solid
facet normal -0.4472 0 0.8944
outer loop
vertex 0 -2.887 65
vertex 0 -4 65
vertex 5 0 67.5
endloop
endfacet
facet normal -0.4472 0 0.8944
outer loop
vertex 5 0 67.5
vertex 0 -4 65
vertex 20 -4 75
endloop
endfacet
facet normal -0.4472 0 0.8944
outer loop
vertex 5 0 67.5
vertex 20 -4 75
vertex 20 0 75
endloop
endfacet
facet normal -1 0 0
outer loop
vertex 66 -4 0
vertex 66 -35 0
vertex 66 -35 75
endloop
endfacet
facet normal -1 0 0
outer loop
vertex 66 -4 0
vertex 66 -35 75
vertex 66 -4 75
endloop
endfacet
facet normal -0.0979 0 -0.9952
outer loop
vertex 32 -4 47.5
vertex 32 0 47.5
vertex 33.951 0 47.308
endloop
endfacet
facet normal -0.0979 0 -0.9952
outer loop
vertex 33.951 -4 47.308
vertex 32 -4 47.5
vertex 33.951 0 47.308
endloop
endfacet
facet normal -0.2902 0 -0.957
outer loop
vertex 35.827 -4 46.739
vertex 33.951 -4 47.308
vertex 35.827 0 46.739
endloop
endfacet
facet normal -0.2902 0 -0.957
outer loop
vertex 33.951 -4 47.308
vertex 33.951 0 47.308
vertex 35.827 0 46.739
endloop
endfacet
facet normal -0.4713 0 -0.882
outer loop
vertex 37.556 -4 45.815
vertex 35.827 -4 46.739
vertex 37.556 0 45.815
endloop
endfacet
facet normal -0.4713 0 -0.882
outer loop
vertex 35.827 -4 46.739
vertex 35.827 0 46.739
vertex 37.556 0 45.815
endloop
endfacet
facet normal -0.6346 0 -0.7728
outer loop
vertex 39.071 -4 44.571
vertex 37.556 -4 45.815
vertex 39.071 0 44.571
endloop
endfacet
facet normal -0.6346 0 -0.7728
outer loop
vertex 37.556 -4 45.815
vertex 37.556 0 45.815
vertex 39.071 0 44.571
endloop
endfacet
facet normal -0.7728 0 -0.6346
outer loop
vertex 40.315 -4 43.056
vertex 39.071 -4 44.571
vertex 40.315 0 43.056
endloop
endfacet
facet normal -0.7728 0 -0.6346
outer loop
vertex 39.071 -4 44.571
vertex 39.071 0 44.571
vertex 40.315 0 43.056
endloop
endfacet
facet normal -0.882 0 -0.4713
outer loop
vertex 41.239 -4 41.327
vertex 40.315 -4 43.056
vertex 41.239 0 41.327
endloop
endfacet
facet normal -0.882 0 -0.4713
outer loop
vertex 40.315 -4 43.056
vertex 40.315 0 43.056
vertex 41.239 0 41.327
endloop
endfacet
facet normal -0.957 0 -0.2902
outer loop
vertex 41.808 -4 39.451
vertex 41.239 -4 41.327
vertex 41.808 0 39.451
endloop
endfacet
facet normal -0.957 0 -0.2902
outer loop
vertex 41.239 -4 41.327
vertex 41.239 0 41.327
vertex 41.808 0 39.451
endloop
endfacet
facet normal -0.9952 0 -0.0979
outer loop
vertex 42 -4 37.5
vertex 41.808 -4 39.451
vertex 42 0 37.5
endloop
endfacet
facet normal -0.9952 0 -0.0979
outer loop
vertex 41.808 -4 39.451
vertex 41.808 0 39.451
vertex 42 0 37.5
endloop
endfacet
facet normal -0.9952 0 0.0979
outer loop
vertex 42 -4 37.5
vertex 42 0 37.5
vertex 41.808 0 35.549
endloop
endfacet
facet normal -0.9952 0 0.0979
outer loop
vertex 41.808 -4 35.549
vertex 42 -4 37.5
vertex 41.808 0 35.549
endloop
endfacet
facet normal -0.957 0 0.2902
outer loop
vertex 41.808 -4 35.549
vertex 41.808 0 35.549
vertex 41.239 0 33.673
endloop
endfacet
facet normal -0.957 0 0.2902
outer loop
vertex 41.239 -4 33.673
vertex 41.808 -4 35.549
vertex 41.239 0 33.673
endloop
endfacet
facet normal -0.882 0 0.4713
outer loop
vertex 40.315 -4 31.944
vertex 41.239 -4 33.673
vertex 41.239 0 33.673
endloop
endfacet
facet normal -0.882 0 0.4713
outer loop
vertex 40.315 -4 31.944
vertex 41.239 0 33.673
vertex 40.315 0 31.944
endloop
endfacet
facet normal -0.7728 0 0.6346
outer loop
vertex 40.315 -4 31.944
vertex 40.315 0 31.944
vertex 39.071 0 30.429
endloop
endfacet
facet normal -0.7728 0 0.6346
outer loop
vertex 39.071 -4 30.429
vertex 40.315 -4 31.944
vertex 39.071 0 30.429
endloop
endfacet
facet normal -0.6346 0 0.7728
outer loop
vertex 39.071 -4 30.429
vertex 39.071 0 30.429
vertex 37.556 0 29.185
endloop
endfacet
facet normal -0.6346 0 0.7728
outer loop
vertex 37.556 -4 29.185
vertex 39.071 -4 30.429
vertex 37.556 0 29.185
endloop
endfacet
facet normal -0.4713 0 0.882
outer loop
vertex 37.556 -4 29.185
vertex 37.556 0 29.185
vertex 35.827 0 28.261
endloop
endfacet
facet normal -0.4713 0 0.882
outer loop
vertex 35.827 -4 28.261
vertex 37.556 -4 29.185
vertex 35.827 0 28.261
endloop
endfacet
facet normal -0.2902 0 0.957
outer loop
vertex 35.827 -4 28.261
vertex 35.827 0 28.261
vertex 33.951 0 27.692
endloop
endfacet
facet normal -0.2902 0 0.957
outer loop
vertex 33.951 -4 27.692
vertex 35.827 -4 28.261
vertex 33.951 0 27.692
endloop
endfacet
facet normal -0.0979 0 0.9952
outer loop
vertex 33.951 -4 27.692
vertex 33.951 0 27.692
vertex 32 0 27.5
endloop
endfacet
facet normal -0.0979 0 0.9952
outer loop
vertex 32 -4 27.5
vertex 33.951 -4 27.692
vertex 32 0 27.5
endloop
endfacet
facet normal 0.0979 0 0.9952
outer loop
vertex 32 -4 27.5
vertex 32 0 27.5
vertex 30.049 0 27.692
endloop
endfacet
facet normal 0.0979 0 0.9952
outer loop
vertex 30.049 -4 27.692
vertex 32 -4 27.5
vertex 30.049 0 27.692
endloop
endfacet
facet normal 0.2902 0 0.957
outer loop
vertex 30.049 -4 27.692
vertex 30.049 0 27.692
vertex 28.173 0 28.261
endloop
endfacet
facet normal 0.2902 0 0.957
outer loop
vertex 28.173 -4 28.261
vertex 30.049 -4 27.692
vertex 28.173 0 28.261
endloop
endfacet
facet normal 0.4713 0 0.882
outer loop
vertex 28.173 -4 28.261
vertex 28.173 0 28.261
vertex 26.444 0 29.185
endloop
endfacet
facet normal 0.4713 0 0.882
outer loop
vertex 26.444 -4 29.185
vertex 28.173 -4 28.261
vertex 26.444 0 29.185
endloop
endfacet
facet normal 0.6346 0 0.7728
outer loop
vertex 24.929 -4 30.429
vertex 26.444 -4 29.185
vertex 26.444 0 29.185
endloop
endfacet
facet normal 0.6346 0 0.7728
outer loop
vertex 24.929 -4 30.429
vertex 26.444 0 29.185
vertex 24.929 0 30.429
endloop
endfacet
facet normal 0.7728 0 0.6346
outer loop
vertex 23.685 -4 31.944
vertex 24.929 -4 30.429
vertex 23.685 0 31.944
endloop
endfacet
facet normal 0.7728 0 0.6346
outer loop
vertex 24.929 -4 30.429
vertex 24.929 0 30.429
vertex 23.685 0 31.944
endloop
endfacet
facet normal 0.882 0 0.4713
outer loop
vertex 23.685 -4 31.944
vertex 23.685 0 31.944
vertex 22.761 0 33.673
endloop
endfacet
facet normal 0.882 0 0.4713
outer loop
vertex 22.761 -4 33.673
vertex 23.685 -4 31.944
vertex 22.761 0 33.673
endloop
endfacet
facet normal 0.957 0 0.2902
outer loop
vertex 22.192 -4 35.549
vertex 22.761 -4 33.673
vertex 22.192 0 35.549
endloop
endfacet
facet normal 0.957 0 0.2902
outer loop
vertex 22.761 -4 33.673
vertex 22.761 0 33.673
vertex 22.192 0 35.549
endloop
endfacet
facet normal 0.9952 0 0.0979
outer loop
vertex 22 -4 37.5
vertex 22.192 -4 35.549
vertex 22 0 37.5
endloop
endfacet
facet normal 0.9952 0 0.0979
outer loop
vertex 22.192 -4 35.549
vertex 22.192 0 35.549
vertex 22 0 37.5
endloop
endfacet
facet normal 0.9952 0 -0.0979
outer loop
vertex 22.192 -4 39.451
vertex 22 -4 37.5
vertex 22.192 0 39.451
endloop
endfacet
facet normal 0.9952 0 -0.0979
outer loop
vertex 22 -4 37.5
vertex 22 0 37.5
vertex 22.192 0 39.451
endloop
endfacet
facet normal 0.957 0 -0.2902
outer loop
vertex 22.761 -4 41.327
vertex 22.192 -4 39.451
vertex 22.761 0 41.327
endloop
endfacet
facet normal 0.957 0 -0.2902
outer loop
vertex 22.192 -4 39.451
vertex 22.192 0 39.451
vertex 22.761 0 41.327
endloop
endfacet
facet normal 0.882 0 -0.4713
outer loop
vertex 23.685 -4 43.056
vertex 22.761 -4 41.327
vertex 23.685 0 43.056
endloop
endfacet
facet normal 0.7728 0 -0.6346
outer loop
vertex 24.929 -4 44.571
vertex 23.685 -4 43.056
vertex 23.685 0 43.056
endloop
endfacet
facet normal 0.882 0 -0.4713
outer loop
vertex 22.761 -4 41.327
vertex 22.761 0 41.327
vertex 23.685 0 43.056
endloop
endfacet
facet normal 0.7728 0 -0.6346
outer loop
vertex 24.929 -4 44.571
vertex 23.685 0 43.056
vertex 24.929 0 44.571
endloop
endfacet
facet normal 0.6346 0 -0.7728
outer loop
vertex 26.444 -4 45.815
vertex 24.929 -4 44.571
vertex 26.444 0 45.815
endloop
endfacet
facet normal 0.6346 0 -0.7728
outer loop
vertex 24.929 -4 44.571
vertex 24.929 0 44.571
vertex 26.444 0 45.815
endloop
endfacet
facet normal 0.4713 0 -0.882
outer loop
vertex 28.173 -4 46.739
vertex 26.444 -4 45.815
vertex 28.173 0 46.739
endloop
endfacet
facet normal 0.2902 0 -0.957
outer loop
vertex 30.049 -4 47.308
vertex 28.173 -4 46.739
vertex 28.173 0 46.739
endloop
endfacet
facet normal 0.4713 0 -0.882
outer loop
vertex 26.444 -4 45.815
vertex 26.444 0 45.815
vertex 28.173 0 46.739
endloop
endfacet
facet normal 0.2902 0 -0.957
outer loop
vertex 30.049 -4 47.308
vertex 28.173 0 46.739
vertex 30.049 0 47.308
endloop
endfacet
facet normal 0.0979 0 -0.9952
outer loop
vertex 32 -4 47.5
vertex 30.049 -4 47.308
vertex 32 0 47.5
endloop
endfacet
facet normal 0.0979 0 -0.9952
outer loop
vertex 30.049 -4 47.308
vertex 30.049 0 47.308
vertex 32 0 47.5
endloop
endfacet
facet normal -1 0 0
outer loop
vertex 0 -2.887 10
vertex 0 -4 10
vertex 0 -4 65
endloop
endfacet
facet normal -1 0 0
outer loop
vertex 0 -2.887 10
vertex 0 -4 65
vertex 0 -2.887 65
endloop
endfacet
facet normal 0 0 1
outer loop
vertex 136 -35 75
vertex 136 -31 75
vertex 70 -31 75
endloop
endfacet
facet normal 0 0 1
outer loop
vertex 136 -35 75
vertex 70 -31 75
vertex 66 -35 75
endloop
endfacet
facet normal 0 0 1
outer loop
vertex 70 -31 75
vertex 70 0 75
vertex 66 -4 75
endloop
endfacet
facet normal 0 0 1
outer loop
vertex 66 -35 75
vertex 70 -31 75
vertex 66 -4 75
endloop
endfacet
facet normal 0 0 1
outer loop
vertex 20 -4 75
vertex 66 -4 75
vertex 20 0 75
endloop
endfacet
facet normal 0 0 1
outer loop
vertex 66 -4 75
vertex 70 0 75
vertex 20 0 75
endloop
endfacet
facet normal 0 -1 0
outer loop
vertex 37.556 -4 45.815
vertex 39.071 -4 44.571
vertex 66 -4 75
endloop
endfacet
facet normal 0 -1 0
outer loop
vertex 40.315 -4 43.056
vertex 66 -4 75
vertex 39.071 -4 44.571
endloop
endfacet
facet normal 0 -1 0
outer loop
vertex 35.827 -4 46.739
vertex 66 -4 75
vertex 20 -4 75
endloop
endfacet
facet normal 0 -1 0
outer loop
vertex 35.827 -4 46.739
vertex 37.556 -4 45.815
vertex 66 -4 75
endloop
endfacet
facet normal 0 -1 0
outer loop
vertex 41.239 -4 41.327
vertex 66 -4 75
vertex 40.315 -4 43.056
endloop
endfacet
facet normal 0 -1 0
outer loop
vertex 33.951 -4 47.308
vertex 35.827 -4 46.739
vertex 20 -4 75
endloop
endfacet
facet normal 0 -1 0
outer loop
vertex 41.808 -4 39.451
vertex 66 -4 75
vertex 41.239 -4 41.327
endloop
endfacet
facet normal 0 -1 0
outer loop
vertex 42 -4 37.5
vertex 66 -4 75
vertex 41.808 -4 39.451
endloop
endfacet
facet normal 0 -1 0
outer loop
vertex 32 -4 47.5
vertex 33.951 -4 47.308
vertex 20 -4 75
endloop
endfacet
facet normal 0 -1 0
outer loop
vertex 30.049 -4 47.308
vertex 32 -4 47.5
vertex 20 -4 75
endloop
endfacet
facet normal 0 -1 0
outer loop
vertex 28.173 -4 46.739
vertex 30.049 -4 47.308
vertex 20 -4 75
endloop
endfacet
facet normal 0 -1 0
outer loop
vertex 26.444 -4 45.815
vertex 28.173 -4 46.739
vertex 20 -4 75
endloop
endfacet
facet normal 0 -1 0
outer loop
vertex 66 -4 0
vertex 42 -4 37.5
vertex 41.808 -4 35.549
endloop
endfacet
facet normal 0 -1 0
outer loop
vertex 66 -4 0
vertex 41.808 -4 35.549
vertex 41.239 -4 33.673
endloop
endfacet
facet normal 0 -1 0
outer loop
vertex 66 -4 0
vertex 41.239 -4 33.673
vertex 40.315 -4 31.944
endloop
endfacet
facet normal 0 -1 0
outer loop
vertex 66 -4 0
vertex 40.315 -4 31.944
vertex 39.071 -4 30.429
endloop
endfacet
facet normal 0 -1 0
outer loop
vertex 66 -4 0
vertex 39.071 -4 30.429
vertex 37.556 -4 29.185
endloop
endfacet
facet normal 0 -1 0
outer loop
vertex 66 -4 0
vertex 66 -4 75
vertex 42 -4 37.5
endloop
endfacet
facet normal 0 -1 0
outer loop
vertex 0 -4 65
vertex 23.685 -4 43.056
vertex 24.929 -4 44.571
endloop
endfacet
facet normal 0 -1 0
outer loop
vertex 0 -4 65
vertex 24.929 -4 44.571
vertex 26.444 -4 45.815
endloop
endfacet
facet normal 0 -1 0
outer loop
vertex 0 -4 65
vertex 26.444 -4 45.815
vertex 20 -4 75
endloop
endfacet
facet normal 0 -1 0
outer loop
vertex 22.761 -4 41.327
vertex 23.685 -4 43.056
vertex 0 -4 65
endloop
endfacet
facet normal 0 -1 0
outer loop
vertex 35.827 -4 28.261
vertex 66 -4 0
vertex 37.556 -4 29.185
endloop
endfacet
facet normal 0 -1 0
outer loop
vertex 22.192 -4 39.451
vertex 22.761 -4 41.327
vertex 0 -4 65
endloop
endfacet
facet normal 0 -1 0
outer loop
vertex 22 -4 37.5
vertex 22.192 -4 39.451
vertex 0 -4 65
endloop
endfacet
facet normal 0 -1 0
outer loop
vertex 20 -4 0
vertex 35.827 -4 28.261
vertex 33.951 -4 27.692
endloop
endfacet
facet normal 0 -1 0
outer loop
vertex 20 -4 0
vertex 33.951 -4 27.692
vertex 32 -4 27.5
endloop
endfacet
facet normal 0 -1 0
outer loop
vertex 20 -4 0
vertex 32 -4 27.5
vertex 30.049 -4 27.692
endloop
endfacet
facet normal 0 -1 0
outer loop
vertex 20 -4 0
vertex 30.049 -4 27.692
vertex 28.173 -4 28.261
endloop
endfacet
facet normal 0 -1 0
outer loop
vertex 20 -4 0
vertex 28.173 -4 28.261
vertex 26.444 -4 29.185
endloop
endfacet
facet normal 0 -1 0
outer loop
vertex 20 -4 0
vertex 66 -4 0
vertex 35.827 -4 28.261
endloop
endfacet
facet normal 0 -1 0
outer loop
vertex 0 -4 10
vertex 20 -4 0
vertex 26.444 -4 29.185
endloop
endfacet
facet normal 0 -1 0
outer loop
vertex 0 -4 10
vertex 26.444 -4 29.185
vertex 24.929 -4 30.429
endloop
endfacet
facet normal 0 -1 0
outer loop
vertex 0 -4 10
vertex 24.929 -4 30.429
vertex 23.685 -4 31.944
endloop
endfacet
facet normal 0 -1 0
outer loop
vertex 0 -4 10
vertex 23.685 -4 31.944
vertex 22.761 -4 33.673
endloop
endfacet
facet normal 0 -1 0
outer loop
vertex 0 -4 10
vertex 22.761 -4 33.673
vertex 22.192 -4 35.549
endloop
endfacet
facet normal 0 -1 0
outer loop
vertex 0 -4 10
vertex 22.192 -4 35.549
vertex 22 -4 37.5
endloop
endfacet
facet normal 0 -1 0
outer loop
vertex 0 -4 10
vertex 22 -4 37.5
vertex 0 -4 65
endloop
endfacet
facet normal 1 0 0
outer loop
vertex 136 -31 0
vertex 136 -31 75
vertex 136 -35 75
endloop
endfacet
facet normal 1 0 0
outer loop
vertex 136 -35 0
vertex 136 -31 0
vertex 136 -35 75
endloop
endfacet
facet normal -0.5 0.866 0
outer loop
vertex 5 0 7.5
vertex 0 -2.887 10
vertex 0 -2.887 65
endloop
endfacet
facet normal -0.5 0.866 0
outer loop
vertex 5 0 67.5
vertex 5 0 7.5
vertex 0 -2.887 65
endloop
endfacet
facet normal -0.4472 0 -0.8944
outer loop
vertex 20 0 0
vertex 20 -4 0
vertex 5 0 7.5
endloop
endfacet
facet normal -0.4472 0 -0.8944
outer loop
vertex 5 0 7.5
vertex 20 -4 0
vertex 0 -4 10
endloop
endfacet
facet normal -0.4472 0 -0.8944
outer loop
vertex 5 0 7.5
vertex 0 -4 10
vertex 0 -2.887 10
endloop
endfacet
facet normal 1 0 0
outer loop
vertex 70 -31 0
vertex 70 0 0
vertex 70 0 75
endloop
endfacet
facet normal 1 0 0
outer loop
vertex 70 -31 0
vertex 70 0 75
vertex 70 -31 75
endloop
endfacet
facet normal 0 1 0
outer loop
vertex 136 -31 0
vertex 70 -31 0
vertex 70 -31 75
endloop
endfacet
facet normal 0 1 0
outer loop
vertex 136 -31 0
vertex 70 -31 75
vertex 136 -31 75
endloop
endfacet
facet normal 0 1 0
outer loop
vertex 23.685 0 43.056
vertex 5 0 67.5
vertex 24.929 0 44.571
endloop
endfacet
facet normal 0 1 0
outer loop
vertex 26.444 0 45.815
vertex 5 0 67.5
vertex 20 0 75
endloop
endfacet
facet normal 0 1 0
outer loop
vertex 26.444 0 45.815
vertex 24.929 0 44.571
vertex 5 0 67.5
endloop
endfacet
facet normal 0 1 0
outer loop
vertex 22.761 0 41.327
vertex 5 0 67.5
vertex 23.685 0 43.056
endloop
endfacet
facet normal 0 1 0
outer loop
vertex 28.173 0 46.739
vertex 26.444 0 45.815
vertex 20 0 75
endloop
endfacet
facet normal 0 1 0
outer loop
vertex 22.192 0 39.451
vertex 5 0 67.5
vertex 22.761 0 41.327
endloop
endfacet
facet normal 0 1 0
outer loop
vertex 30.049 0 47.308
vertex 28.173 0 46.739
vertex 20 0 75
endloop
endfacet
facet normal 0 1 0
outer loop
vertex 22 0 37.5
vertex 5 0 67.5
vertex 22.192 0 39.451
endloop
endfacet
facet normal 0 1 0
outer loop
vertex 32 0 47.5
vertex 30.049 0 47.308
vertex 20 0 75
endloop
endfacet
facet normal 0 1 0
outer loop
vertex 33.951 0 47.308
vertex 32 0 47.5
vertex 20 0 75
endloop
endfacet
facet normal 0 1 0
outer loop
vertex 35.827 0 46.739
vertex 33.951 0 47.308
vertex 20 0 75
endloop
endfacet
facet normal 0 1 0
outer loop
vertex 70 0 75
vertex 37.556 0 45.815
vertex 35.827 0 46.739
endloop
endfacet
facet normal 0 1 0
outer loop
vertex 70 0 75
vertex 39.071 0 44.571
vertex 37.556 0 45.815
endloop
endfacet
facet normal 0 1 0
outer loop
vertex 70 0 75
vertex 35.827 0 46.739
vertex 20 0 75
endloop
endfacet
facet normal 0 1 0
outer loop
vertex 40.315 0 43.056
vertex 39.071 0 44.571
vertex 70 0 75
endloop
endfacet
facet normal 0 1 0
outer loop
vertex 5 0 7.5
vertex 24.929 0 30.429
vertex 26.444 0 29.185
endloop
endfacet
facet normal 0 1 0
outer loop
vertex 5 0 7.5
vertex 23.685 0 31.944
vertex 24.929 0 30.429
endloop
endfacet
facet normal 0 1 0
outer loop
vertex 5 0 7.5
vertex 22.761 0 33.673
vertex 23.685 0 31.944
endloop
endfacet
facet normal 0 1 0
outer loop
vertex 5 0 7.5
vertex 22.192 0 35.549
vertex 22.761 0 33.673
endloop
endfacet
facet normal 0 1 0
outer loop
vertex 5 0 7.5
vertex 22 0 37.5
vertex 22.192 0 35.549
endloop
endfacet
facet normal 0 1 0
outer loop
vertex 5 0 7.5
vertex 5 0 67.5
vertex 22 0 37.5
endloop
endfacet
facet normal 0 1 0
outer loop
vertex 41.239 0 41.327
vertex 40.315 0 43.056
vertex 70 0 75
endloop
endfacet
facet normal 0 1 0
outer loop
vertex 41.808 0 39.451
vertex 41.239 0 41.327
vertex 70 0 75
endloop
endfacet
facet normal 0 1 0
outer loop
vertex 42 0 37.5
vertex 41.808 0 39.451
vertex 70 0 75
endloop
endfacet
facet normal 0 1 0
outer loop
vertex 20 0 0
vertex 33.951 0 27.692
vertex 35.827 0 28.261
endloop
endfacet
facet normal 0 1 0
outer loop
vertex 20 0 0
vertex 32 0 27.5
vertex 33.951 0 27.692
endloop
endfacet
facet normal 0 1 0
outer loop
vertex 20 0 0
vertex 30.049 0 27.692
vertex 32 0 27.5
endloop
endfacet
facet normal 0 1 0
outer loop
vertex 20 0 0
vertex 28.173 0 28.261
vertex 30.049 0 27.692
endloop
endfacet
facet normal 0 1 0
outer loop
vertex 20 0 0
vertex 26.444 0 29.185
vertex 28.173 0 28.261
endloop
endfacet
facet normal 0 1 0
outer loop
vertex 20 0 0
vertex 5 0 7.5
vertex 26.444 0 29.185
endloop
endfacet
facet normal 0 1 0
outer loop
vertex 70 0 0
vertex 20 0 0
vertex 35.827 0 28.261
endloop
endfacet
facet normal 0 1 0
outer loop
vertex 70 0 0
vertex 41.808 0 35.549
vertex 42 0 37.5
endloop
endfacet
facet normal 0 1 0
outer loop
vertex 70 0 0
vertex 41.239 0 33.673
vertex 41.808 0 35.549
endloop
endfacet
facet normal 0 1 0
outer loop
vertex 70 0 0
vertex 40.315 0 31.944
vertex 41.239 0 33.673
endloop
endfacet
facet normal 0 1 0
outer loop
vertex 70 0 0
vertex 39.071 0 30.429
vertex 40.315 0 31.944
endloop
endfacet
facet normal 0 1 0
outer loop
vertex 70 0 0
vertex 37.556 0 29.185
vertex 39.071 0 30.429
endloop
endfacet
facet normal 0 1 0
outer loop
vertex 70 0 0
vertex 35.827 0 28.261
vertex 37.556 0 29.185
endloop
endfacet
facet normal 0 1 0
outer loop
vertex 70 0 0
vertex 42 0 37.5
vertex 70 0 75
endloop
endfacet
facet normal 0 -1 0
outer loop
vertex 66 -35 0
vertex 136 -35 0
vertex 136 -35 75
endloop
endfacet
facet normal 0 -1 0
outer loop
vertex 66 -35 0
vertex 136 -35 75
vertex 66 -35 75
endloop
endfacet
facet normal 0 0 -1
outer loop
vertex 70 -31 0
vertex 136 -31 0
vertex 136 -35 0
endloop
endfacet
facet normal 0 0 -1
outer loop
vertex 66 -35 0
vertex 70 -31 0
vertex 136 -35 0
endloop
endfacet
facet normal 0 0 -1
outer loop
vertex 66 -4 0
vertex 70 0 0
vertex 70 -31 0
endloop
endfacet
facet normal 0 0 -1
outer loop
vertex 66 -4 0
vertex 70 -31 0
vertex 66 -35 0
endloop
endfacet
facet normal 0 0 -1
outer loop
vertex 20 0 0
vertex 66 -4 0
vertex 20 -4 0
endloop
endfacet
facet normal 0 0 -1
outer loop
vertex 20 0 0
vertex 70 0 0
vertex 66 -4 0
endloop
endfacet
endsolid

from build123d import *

# Parameters (mm, degrees)
BOSS_EXTRUDE1_DEPTH = 75
SKETCH2_R           = 10
CUT_EXTRUDE1_DEPTH  = 160.204271299
CHAMFER1_SIZE       = 10
CHAMFER1_SIZE2      = 20
CHAMFER2_SIZE       = 20
CHAMFER2_SIZE2      = 10
CHAMFER3_SIZE       = 5
CHAMFER3_SIZE2      = 2.886751346


with BuildPart() as part:
    # Sketch1 → Boss-Extrude1 (new body)
    with BuildSketch(Plane.XY):
        Polygon((0, 0), (70, 0), (70, -31), (136, -31), (136, -35), (66, -35), (66, -4), (0, -4), align=None)
    extrude(amount=BOSS_EXTRUDE1_DEPTH)

    # Sketch2 → Cut-Extrude1 (cut, through all)
    with BuildSketch(Plane(origin=(0, 0, 0), x_dir=(1, 0, 0), z_dir=(0, 1, 0))):
        with Locations(Location((32, -37.5, 0), (0, 0, 270))):
            Circle(SKETCH2_R)
    extrude(amount=-CUT_EXTRUDE1_DEPTH, mode=Mode.SUBTRACT)

    # Chamfer1
    chamfer1_edges = [part.edges().sort_by_distance(p)[0] for p in [
        (0, -2, 75),
    ]]
    chamfer1_side = [part.faces().sort_by_distance(p)[0] for p in [
        (0, -2, 37.5),
    ]]
    chamfer(chamfer1_edges, length=CHAMFER1_SIZE, length2=CHAMFER1_SIZE2, reference=chamfer1_side[0])

    # Chamfer2
    chamfer2_edges = [part.edges().sort_by_distance(p)[0] for p in [
        (0, -2, 0),
    ]]
    chamfer2_side = [part.faces().sort_by_distance(p)[0] for p in [
        (68, -17.5, 0),
    ]]
    chamfer(chamfer2_edges, length=CHAMFER2_SIZE, length2=CHAMFER2_SIZE2, reference=chamfer2_side[0])

    # Chamfer3
    chamfer3_edges = [part.edges().sort_by_distance(p)[0] for p in [
        (0, 0, 37.5),
    ]]
    chamfer3_side = [part.faces().sort_by_distance(p)[0] for p in [
        (1.025914226, 0, 37.5),
    ]]
    chamfer(chamfer3_edges, length=CHAMFER3_SIZE, length2=CHAMFER3_SIZE2, reference=chamfer3_side[0])


solid = part.part
